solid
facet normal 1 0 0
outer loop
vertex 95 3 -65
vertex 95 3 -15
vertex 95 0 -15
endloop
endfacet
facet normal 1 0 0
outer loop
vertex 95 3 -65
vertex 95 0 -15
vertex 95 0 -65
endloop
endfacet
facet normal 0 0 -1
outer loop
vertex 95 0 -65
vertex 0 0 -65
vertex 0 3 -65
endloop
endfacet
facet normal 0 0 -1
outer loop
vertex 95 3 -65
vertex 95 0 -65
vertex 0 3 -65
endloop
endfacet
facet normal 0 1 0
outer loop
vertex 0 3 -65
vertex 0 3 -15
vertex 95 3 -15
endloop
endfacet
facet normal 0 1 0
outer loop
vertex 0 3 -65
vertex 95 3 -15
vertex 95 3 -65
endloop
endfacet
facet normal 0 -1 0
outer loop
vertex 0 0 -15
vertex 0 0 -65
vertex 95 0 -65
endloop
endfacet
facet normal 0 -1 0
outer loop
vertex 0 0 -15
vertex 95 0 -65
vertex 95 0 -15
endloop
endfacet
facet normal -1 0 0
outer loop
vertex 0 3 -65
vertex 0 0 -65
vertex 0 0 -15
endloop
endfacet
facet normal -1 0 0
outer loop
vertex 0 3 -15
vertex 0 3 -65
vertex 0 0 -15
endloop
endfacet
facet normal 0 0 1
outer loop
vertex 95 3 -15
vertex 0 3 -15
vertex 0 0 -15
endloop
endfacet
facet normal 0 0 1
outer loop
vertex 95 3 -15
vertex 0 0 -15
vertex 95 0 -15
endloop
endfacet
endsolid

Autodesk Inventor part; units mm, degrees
ref_plane "YZ Plane" through (0, 0, 0) normal (1, 0, 0) x (0, 1, 0)
ref_plane "XZ Plane" through (0, 0, 0) normal (0, 1, 0) x (-1, 0, 0)
ref_plane "XY Plane" through (0, 0, 0) normal (0, 0, 1) x (1, 0, 0)
sketch "Boceto1" plane through (0, 0, 0) normal (0, 1, 0) x (-1, 0, 0)
  point P0 (0, 0)
sketch "Boceto2" plane through (0, 0, 0) normal (0, 1, 0) x (-1, 0, 0)
  line L0 (0, 0) -> (-105, 0)
  line L1 (-105, 0) -> (-105, -70)
  line L2 (-105, -70) -> (0, -70)
  line L3 (0, -70) -> (0, 0)
  dimension "d0" = 105
  dimension "d1" = 70
extrude "Extrusión1" add sketch "Boceto2" along normal blind 3
sketch "Boceto3" plane through (0, 0, 0) normal (0, -1, 0) x (1, 0, 0)
  point P0 (0, 0)
sketch "Boceto4" plane through (105, 0, 0) normal (1, 0, 0) x (0, 0, -1)
  line L0 (0, 0) -> (70, 0) projected
  line L1 (70, 0) -> (70, 3) projected
  line L2 (0, 3) -> (70, 3) projected
  line L3 (0, 0) -> (0, 3) projected
extrude "Extrusión2" cut sketch "Boceto4" against normal blind 5
sketch "Boceto5" plane through (100, 0, 0) normal (1, 0, 0) x (0, 0, -1)
  line L0 (0, 3) -> (70, 3) projected
  line L1 (70, 0) -> (0, 0) projected
  line L2 (70, 3) -> (70, 0) projected
  line L3 (0, 3) -> (70, 3) projected
  line L4 (0, 0) -> (0, 3) projected
extrude "Extrusión3" cut sketch "Boceto5" against normal blind 5
sketch "Boceto6" plane through (0, 0, 0) normal (0, -1, 0) x (1, 0, 0)
  line L0 (95, -70) -> (95, 0) projected
  line L1 (0, 0) -> (95, 0) projected
  line L2 (0, -70) -> (0, 0) projected
  line L3 (95, -70) -> (0, -70) projected
  line L4 (0, -70) -> (0, 0) projected
  line L5 (0, 0) -> (90, 0)
  line L6 (90, 0) -> (90, -65)
  line L7 (90, -65) -> (0, -65)
  line L8 (0, -65) -> (0, 0)
  dimension "d8" = 90
  dimension "d9" = 65
extrude "Extrusión4" cut sketch "Boceto6" against normal blind 5 contours L3 L2 L7 L6 L1 L0
sketch "Boceto7" plane through (90, 0, 0) normal (1, 0, 0) x (0, 0, -1)
  line L0 (0, 3) -> (65, 3) projected
  line L1 (0, 0) -> (0, 3) projected
  line L2 (65, 0) -> (0, 0) projected
  line L3 (65, 0) -> (65, 3) projected
extrude "Extrusión5" add sketch "Boceto7" along normal blind 5
sketch "Boceto8" plane through (0, 0, 0) normal (0, 0, 1) x (1, 0, 0)
  line L0 (0, 3) -> (95, 3) projected
  line L1 (0, 0) -> (0, 3) projected
  line L2 (0, 0) -> (95, 0) projected
  line L3 (95, 3) -> (95, 0) projected
extrude "Extrusión6" cut sketch "Boceto8" against normal blind 15
properties part number "inferior y superior" material "Madera (arce)"
